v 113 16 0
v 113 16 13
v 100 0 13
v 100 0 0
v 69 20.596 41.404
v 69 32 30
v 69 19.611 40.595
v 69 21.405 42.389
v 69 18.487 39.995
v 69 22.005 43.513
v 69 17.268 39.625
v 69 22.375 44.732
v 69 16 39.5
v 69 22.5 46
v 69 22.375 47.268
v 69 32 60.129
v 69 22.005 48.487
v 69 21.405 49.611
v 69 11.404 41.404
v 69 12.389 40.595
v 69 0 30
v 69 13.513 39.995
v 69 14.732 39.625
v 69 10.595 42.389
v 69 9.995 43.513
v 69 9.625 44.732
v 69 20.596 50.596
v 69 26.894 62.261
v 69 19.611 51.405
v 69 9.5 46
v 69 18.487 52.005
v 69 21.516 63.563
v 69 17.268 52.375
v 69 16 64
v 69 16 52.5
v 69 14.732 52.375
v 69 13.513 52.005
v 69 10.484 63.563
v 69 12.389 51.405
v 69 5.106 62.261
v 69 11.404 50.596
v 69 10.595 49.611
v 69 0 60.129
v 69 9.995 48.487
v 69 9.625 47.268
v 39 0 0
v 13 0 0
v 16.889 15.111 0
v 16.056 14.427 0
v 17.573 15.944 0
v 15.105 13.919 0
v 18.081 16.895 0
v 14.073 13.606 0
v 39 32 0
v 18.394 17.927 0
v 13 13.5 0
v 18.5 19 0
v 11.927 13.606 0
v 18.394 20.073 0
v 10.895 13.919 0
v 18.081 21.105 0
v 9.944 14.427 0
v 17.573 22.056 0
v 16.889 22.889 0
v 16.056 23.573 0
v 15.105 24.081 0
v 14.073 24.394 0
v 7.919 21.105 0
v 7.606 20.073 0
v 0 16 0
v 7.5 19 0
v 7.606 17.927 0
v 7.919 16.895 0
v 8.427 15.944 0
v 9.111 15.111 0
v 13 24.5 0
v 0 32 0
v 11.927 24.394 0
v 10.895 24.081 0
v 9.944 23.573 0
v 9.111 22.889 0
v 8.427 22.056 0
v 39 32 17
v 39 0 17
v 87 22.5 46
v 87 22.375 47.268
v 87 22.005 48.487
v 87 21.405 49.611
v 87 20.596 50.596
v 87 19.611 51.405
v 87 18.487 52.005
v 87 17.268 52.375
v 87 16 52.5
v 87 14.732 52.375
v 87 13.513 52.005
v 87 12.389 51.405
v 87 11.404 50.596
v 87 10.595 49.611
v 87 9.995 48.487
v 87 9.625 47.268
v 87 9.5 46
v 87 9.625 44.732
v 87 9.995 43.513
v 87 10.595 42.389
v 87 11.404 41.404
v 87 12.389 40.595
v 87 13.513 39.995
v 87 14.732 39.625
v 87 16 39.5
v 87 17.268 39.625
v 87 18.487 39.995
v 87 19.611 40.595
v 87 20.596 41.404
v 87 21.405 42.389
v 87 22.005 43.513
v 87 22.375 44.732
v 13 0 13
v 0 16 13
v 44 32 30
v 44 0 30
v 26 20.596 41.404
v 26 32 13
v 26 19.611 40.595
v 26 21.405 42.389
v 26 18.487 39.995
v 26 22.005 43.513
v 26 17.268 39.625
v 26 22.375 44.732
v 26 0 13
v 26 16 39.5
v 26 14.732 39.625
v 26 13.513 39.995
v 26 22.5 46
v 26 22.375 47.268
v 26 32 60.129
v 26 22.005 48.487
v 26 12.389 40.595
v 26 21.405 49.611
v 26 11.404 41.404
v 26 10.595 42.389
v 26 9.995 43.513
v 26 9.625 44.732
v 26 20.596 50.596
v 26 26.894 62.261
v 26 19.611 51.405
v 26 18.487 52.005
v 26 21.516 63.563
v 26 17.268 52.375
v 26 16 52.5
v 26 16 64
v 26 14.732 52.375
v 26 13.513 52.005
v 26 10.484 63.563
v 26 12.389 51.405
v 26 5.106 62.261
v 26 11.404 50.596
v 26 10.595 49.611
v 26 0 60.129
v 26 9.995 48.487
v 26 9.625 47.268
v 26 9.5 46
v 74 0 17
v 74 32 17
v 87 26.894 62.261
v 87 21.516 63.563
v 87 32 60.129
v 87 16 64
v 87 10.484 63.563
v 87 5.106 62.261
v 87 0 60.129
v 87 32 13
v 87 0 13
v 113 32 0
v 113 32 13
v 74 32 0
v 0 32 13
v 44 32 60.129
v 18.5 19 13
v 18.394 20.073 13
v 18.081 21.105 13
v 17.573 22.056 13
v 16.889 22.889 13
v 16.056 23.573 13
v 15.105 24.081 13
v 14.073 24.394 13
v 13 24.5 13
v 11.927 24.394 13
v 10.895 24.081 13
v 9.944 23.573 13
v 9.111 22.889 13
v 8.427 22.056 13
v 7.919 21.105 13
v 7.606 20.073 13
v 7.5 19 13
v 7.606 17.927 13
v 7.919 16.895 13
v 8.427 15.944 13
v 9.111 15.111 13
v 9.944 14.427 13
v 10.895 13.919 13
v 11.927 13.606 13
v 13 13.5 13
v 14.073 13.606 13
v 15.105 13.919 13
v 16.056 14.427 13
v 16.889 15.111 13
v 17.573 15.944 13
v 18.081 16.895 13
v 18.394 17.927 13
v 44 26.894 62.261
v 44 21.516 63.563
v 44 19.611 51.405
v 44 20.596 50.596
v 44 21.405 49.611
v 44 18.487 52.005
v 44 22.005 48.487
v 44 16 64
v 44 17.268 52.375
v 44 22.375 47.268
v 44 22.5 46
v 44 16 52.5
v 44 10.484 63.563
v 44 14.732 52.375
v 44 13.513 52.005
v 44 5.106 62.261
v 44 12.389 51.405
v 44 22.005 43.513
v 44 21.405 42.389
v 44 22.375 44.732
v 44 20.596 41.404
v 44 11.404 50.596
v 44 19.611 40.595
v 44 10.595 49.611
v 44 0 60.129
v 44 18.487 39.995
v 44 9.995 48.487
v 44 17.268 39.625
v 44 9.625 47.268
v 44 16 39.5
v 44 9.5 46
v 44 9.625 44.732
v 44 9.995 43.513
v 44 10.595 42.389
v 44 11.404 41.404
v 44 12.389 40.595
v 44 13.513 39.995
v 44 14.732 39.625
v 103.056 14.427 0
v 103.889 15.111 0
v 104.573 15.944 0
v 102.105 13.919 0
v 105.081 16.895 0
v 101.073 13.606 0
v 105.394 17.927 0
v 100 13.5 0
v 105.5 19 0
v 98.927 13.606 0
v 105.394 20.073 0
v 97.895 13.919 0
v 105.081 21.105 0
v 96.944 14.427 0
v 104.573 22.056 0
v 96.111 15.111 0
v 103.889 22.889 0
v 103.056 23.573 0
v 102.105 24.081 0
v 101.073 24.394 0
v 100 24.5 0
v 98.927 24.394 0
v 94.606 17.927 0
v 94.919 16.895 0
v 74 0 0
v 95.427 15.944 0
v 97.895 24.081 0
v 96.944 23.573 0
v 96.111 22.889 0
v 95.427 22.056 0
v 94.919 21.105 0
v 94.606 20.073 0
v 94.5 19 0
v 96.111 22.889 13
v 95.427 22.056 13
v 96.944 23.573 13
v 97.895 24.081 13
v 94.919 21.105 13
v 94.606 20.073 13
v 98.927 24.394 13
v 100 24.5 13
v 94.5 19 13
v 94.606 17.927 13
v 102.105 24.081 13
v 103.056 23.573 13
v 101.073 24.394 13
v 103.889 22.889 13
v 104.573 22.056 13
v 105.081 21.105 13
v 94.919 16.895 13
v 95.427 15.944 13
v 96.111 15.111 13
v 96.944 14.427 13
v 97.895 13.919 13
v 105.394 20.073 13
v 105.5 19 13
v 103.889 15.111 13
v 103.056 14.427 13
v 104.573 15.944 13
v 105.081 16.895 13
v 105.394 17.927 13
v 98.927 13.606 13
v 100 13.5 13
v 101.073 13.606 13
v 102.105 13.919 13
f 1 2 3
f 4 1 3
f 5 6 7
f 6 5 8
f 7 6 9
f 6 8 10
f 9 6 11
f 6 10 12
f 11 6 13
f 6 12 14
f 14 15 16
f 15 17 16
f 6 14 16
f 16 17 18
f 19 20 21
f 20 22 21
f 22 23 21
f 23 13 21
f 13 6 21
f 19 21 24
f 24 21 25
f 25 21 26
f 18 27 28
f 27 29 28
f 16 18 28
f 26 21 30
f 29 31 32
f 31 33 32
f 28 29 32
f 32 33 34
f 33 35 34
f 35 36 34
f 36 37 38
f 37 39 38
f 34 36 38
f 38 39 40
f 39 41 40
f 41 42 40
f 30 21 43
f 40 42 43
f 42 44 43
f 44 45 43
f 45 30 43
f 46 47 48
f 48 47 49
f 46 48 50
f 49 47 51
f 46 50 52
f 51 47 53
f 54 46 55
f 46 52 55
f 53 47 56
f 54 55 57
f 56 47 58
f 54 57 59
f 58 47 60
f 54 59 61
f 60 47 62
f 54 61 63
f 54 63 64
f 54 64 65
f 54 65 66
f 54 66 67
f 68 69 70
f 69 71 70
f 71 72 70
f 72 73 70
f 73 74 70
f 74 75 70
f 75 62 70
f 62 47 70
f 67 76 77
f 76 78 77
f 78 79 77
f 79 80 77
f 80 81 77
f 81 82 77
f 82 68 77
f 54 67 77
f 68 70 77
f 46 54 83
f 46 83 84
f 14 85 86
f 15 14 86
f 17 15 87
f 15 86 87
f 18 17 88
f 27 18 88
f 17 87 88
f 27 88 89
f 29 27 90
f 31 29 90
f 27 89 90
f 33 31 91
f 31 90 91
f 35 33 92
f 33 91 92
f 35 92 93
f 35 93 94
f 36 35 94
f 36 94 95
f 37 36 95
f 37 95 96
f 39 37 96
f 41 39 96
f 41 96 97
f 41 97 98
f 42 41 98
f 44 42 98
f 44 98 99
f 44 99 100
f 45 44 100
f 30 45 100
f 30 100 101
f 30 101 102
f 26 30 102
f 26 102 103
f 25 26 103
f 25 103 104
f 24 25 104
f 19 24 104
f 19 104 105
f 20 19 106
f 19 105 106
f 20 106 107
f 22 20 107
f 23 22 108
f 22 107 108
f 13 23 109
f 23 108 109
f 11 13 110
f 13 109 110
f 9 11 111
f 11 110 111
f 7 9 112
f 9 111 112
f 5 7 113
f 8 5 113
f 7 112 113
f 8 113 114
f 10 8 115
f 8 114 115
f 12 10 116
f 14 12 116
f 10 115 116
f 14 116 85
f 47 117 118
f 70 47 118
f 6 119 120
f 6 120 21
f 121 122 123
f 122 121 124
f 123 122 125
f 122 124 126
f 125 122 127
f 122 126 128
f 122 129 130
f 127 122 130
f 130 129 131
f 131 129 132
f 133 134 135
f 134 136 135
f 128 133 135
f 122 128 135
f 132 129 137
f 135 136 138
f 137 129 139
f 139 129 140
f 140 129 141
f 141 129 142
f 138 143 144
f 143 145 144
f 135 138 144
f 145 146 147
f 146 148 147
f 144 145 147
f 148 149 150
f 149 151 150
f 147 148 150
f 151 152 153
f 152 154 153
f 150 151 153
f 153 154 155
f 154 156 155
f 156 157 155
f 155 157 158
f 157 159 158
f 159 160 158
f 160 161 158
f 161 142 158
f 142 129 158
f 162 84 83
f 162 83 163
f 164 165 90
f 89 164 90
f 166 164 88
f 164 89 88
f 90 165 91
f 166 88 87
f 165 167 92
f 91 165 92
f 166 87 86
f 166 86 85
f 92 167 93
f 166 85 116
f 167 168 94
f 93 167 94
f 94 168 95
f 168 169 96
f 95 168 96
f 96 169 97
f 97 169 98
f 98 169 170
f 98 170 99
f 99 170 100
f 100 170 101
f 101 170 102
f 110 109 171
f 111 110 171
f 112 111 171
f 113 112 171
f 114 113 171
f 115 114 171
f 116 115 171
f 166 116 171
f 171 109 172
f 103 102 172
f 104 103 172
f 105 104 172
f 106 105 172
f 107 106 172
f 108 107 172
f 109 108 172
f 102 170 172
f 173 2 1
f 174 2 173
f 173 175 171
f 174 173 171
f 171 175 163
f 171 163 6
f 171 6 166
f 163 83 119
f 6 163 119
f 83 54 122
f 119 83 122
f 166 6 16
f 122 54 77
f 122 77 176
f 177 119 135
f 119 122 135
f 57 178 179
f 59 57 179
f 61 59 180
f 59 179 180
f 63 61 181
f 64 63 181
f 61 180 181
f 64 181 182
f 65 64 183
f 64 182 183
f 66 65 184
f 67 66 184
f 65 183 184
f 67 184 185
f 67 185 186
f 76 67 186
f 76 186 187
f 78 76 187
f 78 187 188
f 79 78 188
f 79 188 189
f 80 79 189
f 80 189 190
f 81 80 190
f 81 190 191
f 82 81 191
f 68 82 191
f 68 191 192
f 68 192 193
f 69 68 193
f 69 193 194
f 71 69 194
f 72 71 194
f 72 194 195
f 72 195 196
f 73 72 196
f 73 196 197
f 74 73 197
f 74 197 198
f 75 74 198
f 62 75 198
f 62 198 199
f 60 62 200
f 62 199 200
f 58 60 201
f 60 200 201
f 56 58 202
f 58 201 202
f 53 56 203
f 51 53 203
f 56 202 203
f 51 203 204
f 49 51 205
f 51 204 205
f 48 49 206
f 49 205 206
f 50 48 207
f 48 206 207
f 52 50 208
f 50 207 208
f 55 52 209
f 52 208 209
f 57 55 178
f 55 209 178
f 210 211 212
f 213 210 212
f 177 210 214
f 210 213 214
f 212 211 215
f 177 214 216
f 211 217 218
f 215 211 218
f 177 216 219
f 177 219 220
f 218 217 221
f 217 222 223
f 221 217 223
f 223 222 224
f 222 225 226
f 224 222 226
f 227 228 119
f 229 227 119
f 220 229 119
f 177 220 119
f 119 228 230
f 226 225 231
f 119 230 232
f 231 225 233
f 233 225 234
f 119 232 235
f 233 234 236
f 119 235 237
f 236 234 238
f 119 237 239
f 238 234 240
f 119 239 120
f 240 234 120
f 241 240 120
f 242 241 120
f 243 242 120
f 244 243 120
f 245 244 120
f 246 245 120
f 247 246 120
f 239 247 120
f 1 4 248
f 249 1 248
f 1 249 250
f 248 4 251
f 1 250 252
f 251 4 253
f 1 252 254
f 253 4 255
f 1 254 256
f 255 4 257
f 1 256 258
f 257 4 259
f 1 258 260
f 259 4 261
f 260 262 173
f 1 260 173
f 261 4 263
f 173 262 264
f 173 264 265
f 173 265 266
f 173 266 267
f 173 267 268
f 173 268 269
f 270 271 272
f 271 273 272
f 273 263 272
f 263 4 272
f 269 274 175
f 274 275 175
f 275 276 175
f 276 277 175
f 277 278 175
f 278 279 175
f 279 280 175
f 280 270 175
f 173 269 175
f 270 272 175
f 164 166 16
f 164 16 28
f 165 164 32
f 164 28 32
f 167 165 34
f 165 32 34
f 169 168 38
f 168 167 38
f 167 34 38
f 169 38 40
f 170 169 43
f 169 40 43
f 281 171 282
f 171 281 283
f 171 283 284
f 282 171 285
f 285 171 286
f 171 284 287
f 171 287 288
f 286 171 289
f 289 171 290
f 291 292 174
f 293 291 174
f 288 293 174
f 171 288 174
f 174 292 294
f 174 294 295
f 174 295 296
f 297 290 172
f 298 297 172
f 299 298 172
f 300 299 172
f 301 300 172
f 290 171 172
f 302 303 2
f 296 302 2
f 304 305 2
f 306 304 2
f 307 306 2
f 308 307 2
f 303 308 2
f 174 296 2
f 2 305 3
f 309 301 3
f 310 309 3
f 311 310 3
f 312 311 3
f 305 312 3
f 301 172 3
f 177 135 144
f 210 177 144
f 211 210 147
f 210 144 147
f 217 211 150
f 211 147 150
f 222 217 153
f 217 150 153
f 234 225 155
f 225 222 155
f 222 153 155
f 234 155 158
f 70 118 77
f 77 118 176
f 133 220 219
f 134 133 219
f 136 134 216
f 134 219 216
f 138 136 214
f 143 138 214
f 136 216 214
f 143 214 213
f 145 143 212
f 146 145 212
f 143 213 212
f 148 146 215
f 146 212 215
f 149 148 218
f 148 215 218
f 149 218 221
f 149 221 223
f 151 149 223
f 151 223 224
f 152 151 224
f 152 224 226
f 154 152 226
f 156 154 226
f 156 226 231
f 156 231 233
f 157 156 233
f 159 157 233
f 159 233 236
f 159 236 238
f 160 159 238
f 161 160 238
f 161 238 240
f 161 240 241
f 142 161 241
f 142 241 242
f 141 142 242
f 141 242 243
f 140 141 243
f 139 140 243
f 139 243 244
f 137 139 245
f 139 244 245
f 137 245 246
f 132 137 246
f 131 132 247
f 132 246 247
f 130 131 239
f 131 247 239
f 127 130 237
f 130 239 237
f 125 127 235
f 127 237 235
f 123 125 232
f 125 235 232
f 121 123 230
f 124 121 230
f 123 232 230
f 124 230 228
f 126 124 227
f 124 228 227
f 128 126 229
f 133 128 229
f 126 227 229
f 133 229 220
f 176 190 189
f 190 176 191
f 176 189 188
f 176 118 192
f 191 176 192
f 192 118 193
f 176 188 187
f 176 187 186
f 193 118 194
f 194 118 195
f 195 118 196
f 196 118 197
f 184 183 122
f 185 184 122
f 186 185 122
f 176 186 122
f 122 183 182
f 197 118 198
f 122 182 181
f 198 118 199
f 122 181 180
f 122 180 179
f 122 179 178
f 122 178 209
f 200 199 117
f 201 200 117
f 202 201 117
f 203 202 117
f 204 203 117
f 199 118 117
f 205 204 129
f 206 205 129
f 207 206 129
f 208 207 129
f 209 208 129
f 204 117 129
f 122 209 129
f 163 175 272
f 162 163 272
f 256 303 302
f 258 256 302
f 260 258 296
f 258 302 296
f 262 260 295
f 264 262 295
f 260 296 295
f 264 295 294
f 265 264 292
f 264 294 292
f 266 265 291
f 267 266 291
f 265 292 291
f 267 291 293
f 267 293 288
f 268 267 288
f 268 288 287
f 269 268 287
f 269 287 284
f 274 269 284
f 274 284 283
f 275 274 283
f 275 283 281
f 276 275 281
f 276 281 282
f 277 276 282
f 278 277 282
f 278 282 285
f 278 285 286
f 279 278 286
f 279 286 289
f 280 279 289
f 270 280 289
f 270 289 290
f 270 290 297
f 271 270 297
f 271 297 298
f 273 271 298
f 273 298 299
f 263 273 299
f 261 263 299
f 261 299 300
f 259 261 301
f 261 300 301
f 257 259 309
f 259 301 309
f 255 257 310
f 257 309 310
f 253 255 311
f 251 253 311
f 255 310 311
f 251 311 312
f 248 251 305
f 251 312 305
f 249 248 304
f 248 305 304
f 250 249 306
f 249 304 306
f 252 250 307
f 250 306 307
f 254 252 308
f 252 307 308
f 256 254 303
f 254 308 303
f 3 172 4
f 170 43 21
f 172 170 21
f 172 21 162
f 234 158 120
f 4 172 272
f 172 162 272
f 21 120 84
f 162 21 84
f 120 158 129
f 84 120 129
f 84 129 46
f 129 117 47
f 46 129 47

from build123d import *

# Parameters (mm, degrees)
F0_W      = 32
F0_H      = 13
F1_DEPTH  = 113
F2_W      = 35
F2_H      = 32
F3_DEPTH  = 17
F4_W      = 25
F4_H      = 30.1287648325
F4_H_2    = 18.8096150512
F4_W_2    = 26
F4_H_3    = 47.1287648325
F5_DEPTH  = 32.001
F6_R      = 5.5
F7_DEPTH  = 13.001
F8_R      = 5.5
F9_DEPTH  = 13.001
F10_R     = 6.5
F11_DEPTH = 87.001


with BuildPart() as f1:
    # F0 (on Right) → F1 (new body)
    with BuildSketch(Plane.YZ):
        with Locations((16, 6.5)):
            Rectangle(F0_W, F0_H)
        with BuildLine():
            Line((0, 60.1287648325), (0, 13))
            Line((0, 13), (32, 13))
            Line((32, 13), (32, 60.1287648325))
            ThreePointArc((32, 60.1287648325), (16, 64), (0, 60.1287648325))
        make_face()
    extrude(amount=F1_DEPTH)

    # F2 (on face) → F3 (cut)
    with BuildSketch(Plane(origin=(0, 0, 0), x_dir=(1, 0, 0), z_dir=(0, 0, -1))):
        with Locations((56.5, -16)):
            Rectangle(F2_W, F2_H)
    extrude(amount=-F3_DEPTH, mode=Mode.SUBTRACT)

    # F4 (on face) → F5 (cut, through all)
    with BuildSketch(Plane.XZ):
        with Locations((56.5, 45.0643824163)):
            Rectangle(F4_W, F4_H)
        with Locations((56.5, 69.5335723582)):
            Rectangle(F4_W, F4_H_2)
        with Locations((100, 36.5643824163)):
            Rectangle(F4_W_2, F4_H_3)
        with Locations((100, 69.5335723582)):
            Rectangle(F4_W_2, F4_H_2)
        with Locations((13, 69.5335723582)):
            Rectangle(F4_W_2, F4_H_2)
        with Locations((13, 36.5643824163)):
            Rectangle(F4_W_2, F4_H_3)
    extrude(amount=-F5_DEPTH, mode=Mode.SUBTRACT)

    # F6 (on face) → F7 (cut, through all)
    with BuildSketch(Plane.XY.offset(13)):
        Polygon((113, 0), (113, 16), (100, 0), align=None)
        with Locations((100, 19)):
            Circle(F6_R)
    extrude(amount=-F7_DEPTH, mode=Mode.SUBTRACT)

    # F8 (on face) → F9 (cut, through all)
    with BuildSketch(Plane.XY.offset(13)):
        with Locations((13, 19)):
            Circle(F8_R)
        Polygon((0, 16), (0, 0), (13, 0), align=None)
    extrude(amount=-F9_DEPTH, mode=Mode.SUBTRACT)

    # F10 (on face) → F11 (cut, through all)
    with BuildSketch(Plane.YZ.offset(87)):
        with Locations((16, 46)):
            Circle(F10_R)
    extrude(amount=-F11_DEPTH, mode=Mode.SUBTRACT)


solid = f1.part
